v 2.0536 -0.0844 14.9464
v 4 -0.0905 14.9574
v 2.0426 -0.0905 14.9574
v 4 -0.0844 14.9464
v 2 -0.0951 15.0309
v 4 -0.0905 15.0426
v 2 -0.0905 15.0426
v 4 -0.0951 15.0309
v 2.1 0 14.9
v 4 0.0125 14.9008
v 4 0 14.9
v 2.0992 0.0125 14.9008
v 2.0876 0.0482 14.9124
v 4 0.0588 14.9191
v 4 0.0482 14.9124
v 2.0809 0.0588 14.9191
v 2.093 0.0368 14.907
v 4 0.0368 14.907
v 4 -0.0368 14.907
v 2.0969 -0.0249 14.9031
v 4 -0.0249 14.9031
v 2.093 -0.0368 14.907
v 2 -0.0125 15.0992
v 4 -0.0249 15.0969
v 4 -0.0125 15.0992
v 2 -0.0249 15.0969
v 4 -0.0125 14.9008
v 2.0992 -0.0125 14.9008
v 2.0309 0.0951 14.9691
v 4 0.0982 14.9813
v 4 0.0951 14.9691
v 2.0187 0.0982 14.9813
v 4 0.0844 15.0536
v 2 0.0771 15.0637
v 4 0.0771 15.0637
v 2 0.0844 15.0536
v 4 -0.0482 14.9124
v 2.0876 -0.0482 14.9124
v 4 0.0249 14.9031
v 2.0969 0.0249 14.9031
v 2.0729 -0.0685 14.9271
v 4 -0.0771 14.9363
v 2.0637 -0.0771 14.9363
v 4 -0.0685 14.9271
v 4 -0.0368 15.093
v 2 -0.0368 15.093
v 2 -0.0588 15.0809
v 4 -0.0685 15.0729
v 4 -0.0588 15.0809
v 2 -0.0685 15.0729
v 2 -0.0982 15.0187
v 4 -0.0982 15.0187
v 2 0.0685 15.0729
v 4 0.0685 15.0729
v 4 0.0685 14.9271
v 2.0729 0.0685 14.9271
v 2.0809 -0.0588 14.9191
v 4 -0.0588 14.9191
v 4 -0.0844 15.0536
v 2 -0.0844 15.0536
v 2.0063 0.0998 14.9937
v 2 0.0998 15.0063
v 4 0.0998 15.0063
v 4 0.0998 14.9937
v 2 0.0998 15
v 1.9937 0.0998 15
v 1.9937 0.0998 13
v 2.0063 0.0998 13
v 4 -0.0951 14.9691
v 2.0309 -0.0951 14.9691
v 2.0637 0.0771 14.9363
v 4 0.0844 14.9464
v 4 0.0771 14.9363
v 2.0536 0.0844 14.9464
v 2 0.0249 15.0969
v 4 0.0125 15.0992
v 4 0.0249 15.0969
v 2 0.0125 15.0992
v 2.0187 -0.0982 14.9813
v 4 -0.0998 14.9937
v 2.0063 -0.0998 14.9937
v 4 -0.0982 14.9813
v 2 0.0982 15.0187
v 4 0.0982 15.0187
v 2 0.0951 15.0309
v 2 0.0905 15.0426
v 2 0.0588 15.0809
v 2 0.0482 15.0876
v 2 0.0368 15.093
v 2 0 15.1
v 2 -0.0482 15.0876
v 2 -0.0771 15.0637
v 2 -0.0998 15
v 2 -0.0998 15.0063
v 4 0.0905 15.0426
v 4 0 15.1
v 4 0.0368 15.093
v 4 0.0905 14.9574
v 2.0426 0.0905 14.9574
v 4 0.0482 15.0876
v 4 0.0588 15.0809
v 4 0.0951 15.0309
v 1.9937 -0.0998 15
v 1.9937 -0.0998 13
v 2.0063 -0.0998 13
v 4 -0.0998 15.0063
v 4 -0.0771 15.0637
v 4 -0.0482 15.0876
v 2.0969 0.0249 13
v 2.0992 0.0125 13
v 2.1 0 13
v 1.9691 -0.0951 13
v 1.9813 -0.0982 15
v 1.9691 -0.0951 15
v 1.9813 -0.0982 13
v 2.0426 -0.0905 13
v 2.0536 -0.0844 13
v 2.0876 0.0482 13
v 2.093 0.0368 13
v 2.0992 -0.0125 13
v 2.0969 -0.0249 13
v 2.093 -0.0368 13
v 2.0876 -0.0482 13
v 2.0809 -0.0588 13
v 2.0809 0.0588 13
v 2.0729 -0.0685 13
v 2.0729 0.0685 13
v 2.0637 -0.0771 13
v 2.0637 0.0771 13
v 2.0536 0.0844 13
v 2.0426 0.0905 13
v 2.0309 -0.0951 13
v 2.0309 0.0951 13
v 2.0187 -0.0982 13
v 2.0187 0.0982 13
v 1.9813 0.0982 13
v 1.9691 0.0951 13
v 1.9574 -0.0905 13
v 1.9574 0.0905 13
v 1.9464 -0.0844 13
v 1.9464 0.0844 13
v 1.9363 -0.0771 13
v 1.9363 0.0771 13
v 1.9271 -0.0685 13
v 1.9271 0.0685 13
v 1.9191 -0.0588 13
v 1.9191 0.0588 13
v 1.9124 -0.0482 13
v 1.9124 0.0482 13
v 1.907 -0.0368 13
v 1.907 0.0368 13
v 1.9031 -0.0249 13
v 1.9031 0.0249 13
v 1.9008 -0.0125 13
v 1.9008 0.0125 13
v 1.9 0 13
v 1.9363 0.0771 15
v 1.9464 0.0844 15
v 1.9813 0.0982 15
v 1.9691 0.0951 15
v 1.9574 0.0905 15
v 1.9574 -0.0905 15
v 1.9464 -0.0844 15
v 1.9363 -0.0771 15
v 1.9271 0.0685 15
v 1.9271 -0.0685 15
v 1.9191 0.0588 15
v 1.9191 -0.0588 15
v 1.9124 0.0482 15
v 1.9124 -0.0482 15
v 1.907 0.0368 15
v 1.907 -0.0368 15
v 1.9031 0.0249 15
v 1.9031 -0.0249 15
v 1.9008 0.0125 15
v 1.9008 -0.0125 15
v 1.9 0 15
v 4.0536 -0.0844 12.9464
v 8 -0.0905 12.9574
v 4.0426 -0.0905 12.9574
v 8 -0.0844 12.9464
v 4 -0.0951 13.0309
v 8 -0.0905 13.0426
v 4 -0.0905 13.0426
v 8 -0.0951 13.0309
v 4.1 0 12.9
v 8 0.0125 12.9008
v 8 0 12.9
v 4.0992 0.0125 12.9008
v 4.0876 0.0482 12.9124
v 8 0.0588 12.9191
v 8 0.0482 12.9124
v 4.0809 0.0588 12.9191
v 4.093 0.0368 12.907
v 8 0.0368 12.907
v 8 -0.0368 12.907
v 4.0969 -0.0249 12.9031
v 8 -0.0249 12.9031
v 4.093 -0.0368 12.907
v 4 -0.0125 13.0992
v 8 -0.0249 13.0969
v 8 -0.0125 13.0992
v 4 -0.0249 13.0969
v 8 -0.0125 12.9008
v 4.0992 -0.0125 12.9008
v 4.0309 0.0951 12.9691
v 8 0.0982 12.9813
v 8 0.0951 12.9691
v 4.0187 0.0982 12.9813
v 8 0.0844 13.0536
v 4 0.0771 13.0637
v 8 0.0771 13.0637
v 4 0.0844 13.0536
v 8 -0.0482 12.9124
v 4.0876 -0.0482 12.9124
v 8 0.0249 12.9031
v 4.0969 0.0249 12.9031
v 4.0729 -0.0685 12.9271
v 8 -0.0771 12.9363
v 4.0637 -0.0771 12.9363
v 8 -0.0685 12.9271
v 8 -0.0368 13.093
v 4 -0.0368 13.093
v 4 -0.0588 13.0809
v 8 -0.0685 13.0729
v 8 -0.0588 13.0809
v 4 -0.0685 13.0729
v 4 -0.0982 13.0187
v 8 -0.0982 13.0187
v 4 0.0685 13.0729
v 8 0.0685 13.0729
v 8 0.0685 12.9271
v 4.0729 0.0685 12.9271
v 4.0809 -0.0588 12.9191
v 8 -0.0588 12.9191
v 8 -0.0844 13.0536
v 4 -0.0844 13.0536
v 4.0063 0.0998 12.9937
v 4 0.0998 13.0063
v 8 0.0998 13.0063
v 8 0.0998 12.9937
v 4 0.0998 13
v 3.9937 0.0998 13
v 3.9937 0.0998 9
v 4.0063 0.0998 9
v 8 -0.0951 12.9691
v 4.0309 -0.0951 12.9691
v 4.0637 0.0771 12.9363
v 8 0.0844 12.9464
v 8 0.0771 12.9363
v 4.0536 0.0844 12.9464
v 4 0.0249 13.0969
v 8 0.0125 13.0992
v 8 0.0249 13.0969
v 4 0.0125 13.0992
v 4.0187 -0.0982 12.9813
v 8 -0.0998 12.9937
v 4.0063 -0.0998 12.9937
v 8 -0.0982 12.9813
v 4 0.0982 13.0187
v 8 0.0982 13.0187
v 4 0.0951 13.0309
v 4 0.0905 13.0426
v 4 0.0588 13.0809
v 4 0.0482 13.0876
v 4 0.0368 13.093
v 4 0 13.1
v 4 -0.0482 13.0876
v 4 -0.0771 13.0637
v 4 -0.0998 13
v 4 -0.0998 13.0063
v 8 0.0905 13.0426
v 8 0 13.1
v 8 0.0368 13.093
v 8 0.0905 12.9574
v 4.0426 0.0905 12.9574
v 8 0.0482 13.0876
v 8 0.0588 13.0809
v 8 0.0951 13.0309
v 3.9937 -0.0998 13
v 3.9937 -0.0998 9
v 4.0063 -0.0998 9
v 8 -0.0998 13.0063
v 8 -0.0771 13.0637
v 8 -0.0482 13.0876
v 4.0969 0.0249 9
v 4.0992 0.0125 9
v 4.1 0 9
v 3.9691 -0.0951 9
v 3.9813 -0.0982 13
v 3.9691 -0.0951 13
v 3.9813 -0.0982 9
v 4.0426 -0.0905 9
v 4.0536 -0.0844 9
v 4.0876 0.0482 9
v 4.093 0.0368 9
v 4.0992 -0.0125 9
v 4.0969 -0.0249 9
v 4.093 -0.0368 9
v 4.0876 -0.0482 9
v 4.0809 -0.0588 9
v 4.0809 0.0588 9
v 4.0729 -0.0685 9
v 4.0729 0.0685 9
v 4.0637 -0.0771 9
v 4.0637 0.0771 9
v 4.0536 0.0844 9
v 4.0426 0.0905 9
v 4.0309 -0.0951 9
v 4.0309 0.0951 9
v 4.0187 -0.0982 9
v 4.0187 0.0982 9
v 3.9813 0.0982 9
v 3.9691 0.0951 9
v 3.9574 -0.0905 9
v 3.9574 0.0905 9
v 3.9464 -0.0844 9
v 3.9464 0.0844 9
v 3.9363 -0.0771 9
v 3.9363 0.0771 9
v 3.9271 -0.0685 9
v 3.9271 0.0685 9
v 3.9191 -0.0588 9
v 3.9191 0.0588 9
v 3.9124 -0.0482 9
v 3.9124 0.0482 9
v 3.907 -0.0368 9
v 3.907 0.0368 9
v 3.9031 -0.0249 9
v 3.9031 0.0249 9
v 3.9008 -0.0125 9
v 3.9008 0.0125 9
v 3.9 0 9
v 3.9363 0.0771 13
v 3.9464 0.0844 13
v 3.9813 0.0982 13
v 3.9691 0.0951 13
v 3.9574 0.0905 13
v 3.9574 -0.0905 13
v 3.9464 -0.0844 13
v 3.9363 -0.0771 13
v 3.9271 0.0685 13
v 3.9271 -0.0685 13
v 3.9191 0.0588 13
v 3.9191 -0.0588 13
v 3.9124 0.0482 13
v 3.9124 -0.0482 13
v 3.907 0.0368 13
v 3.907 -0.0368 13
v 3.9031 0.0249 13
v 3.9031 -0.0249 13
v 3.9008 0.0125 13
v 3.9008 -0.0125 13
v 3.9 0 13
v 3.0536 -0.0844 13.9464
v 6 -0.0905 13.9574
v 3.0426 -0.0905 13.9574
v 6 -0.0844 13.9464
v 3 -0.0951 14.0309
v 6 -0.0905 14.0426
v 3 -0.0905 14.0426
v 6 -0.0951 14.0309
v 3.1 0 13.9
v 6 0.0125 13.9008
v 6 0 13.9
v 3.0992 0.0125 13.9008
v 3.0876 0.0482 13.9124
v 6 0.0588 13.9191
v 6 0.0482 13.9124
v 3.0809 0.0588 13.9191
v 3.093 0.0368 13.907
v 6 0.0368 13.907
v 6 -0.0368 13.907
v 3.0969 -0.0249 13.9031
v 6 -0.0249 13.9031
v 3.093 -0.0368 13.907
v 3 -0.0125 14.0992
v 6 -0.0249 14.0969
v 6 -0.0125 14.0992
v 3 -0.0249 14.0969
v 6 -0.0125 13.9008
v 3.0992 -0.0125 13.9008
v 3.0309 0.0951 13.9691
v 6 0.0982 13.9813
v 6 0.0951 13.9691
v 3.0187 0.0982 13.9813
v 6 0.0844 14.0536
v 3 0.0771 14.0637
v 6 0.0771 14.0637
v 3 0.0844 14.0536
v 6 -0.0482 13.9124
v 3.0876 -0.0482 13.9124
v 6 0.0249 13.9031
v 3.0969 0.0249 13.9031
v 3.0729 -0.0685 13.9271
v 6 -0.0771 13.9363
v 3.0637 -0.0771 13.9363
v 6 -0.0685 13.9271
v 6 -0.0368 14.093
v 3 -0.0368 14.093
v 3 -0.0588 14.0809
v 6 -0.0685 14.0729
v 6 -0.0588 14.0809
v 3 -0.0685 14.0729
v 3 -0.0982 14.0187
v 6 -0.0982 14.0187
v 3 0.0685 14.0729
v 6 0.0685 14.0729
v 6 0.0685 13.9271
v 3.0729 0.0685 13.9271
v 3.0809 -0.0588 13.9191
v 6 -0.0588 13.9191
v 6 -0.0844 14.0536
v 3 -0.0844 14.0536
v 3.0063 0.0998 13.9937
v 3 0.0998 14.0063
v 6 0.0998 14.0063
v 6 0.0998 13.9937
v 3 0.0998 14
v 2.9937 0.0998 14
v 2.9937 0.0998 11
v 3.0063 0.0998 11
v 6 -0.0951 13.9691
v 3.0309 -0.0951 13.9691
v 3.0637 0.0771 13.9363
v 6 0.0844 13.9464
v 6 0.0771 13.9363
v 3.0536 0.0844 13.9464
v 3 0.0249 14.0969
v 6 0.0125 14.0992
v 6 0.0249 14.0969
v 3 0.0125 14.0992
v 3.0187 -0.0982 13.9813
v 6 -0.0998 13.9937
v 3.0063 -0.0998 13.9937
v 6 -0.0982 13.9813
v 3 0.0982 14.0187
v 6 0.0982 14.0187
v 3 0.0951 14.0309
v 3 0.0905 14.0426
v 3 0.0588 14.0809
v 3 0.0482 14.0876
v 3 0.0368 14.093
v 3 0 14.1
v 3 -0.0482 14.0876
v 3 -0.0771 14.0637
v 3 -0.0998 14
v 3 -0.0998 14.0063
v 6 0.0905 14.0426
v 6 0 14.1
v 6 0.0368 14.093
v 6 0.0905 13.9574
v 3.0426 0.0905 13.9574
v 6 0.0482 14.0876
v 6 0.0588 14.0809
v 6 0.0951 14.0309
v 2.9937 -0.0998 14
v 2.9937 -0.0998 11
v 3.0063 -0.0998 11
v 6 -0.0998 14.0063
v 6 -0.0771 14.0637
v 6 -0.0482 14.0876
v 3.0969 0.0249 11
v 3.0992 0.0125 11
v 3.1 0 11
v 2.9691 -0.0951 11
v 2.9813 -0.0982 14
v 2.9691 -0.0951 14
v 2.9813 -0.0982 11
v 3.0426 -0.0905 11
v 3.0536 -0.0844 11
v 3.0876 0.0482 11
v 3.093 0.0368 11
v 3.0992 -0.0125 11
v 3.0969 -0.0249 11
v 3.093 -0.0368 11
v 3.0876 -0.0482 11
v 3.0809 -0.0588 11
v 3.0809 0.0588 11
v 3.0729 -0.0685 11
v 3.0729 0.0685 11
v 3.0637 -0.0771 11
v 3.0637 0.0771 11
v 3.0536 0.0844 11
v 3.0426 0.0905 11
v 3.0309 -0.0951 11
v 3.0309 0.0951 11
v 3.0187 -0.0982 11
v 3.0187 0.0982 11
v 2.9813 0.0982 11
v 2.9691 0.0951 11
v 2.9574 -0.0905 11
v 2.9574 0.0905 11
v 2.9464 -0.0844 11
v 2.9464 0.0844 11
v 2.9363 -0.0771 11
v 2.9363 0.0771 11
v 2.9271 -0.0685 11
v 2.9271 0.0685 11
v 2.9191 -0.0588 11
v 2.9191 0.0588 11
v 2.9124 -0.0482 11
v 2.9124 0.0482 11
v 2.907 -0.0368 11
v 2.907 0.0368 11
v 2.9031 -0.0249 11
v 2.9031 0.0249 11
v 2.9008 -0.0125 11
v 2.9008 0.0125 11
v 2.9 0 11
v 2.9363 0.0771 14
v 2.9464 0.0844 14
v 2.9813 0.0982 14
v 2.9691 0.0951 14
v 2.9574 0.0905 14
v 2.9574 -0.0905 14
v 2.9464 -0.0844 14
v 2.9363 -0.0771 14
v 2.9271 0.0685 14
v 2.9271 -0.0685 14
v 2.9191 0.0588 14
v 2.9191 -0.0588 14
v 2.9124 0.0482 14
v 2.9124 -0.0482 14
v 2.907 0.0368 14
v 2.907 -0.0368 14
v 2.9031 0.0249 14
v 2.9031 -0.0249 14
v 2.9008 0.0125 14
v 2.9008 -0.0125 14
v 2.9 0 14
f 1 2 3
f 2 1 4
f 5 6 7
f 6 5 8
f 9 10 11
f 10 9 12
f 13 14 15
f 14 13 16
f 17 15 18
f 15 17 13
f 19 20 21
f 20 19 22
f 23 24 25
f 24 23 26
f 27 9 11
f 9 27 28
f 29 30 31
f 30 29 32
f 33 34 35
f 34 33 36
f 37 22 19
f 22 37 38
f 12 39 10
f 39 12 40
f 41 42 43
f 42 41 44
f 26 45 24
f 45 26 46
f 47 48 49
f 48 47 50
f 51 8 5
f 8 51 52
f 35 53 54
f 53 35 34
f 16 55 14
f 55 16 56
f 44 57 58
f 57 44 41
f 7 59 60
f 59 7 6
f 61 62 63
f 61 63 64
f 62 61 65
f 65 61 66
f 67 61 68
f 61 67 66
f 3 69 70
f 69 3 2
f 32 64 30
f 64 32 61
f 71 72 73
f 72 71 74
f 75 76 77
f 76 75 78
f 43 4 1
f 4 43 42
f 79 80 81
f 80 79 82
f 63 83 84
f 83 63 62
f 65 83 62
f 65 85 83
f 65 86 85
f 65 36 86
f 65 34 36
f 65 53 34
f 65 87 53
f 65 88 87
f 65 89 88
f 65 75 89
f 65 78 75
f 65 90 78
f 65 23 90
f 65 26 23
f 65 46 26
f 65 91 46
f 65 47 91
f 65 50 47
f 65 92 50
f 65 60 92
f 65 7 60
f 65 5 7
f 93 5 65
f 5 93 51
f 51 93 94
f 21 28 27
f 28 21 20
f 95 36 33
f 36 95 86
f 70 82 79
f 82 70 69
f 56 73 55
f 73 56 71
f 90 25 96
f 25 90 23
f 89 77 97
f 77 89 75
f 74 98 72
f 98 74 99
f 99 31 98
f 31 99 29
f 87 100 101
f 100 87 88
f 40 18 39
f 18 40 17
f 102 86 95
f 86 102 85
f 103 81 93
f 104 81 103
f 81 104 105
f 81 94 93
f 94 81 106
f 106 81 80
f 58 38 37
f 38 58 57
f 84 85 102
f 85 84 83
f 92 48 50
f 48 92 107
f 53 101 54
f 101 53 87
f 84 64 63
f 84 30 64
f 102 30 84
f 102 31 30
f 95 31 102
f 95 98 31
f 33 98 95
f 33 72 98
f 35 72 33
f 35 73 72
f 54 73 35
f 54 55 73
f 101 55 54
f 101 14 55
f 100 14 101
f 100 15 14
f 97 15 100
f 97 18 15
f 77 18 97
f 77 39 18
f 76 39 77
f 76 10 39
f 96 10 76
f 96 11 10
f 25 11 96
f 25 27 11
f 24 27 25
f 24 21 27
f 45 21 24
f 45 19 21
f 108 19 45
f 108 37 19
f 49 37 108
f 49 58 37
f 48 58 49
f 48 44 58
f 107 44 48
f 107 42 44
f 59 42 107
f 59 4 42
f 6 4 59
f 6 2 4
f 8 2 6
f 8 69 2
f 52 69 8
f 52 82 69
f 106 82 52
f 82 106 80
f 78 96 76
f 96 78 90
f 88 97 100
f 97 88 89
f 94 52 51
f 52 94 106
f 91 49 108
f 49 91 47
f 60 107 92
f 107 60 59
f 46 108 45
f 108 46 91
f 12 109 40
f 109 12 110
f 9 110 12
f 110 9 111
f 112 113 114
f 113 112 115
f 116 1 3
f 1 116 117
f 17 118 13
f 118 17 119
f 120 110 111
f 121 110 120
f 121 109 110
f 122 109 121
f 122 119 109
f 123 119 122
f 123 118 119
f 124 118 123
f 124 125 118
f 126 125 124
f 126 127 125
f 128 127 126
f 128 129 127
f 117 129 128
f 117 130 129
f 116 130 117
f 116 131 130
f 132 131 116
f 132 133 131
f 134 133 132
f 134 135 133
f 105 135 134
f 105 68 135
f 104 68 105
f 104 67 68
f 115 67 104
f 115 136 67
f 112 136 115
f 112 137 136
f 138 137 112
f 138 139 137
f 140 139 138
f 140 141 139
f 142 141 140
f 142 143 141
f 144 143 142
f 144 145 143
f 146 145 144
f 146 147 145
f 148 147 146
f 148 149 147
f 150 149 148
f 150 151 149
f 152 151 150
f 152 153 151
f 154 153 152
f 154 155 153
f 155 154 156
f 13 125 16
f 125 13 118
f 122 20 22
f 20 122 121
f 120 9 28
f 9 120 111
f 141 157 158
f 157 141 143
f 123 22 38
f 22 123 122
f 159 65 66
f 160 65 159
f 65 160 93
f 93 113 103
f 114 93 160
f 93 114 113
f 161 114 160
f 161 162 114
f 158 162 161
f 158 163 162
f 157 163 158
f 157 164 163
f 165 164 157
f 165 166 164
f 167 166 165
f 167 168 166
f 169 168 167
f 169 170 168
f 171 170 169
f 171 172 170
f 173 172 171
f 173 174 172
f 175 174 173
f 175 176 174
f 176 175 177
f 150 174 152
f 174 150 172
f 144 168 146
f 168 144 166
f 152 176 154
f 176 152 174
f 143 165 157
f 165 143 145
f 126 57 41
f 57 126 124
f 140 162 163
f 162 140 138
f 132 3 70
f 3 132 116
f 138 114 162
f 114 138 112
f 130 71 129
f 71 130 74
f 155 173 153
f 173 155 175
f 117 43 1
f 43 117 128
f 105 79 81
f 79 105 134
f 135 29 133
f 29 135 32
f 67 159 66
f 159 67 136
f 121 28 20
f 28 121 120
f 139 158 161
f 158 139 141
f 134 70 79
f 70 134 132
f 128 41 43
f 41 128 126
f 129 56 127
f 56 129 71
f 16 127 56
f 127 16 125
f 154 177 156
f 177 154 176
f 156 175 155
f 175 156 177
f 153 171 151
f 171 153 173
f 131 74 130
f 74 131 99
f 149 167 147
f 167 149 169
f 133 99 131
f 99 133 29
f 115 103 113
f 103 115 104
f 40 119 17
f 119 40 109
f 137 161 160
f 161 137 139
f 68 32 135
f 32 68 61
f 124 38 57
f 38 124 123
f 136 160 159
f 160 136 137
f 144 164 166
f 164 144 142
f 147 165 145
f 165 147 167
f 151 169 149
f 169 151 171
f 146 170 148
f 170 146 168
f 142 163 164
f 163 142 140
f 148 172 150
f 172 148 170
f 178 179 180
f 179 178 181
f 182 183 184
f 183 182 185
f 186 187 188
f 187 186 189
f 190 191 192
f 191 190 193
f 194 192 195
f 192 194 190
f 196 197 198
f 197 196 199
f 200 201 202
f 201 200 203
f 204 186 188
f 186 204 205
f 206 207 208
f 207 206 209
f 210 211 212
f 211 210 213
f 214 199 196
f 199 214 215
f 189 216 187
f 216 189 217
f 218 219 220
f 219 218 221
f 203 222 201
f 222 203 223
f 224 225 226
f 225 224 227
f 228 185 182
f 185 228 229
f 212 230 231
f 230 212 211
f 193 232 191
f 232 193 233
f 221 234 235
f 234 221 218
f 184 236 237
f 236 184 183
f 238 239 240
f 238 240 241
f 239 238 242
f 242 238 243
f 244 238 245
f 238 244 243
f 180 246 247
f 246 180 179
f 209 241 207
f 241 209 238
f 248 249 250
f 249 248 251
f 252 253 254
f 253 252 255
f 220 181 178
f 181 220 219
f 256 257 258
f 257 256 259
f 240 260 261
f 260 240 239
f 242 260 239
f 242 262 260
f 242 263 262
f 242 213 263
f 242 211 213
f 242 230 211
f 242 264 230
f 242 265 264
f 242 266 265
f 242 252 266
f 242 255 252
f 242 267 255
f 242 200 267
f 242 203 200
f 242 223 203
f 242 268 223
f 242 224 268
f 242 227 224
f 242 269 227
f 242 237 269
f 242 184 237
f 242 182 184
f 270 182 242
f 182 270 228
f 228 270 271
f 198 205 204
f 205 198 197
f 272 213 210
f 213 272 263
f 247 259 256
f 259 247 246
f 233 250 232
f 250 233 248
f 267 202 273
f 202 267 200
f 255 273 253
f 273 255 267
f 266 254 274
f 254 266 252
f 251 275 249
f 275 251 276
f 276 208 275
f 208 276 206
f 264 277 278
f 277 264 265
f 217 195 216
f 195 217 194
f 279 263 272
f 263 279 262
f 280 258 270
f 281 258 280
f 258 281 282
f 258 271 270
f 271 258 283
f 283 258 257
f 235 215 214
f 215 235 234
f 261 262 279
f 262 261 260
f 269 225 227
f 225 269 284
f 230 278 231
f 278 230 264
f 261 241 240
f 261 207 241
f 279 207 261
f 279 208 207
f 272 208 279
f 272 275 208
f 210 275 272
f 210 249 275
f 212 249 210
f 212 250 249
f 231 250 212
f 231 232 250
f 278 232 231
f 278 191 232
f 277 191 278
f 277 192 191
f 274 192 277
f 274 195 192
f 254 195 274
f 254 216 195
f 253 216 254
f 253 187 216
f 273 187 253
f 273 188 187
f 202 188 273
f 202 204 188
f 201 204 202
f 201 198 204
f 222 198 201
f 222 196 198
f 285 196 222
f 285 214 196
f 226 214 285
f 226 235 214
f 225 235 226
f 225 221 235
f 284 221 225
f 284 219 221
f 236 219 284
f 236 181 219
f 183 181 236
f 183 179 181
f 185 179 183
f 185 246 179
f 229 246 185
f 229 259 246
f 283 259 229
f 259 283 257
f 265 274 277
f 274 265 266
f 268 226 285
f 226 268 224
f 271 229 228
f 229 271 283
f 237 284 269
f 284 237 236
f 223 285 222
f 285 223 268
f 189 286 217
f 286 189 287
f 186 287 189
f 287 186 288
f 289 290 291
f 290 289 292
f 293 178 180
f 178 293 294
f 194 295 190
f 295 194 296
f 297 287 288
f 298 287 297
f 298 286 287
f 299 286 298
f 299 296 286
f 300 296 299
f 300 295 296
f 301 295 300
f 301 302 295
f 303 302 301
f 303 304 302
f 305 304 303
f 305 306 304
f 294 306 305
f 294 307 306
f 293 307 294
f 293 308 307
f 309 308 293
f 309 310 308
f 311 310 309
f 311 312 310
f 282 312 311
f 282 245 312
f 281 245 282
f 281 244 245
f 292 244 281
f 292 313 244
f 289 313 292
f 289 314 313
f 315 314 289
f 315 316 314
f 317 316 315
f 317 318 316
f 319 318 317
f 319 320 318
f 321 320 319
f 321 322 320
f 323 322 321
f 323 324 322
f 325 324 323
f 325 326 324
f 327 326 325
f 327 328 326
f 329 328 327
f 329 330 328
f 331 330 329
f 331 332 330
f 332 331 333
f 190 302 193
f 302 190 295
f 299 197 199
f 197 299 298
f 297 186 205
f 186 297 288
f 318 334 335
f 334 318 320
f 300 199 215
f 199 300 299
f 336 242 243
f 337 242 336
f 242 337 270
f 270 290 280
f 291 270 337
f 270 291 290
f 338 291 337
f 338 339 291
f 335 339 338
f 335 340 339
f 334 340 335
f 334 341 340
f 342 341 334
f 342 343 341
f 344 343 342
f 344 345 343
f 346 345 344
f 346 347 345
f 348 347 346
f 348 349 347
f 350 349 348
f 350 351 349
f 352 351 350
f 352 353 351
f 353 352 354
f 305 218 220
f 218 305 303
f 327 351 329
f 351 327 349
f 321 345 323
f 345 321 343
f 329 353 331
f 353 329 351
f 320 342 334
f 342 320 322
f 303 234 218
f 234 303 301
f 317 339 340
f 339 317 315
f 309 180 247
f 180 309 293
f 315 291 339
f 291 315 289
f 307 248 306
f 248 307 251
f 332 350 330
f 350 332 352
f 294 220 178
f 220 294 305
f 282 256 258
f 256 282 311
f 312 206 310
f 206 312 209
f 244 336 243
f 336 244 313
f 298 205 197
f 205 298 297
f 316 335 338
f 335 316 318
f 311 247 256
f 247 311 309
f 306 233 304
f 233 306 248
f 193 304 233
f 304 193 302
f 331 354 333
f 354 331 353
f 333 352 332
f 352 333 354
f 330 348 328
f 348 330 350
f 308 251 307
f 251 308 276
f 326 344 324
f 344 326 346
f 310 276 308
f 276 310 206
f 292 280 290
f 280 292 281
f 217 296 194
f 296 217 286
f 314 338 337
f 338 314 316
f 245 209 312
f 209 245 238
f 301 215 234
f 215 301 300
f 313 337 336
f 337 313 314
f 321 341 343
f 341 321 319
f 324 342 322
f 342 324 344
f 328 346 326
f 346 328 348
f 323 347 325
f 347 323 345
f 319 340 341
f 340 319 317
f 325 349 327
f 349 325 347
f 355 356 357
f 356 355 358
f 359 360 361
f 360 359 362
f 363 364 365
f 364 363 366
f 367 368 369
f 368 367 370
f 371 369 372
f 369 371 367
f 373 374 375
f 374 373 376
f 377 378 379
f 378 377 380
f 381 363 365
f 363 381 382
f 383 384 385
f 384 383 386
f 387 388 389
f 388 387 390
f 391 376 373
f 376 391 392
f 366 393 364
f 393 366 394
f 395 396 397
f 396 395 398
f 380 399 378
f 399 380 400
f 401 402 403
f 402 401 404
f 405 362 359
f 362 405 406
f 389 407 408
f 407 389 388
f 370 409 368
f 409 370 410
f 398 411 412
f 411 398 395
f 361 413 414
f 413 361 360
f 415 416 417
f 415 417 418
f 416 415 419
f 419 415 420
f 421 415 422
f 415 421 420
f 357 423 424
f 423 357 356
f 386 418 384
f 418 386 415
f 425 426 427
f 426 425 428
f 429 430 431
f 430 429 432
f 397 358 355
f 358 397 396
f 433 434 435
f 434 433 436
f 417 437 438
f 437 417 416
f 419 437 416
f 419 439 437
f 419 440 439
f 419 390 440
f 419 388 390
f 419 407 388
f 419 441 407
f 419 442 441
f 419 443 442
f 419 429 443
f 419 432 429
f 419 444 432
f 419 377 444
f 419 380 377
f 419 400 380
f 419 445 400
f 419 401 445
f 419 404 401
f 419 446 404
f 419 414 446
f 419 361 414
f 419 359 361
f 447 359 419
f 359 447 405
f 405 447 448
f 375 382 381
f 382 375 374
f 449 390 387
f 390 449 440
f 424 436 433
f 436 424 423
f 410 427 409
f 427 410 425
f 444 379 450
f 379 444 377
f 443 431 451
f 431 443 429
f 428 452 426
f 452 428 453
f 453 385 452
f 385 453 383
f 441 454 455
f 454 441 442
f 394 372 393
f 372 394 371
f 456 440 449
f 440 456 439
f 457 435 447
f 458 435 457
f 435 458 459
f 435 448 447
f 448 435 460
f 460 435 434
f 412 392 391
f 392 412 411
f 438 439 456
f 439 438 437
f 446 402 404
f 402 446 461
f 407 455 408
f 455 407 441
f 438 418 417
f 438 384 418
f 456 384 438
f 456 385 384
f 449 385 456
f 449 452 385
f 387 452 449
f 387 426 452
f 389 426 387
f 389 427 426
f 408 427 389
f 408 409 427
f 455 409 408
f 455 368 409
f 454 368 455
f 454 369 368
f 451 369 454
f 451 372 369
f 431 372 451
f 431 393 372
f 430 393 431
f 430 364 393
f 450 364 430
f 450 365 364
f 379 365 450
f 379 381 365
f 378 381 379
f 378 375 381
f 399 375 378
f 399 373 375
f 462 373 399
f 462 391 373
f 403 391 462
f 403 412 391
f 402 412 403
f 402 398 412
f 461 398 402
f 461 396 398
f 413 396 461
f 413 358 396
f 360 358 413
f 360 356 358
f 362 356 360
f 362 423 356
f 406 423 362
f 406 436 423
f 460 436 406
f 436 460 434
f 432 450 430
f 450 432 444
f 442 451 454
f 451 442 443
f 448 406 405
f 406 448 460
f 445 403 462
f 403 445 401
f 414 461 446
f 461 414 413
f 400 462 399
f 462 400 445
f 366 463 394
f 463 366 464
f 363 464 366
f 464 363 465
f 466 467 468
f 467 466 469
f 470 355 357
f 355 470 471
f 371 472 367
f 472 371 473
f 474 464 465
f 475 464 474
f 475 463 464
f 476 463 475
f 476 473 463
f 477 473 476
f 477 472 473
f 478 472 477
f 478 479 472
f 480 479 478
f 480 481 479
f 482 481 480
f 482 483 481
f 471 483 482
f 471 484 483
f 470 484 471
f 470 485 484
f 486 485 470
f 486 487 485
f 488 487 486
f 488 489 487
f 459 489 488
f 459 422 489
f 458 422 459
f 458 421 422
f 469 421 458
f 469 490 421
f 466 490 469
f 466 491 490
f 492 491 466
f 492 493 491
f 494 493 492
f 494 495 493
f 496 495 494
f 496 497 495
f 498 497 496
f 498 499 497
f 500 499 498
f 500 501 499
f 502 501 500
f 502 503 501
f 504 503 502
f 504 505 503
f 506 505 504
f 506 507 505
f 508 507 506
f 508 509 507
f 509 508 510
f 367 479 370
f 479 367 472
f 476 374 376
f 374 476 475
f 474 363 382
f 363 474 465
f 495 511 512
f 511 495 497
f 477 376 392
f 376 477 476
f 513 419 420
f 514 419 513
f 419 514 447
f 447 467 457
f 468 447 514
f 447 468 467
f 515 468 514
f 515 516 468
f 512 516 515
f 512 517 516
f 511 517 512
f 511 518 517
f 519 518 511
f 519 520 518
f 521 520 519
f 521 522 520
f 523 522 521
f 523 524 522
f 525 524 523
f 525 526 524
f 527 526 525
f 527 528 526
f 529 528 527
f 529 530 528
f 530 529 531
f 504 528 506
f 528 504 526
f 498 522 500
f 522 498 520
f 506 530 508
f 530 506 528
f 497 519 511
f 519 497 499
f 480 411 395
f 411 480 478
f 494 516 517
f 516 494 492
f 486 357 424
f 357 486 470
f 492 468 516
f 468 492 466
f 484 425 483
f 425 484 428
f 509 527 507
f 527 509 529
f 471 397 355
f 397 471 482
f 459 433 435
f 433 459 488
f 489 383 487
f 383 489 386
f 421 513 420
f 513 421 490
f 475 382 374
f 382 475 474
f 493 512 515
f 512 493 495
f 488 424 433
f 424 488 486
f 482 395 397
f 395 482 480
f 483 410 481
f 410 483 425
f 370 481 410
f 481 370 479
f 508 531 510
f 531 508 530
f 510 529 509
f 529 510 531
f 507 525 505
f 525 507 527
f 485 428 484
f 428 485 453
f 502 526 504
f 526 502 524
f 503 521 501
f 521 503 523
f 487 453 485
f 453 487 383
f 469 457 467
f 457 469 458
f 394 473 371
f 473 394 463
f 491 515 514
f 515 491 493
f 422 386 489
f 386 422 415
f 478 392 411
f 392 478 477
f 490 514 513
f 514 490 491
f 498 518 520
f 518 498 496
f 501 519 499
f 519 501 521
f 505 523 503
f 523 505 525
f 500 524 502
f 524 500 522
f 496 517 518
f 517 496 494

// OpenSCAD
translate([2, 0, 15]) {
    rotate([0, 90, 0]) {
        cylinder(h = 2, $fn = 50, r = 0.1);
    }
}

translate([2, 0, 13]) {
   cylinder(h = 2, $fn = 50, r = 0.1);
}


translate([4, 0, 13]) {
    rotate([0, 90, 0]) {
        cylinder(h = 4, $fn = 50, r = 0.1);
    }
}

translate([4, 0, 9]) {
   cylinder(h = 4, $fn = 50, r = 0.1);
}

translate([3, 0, 14]) {
    rotate([0, 90, 0]) {
        cylinder(h = 3, $fn = 50, r = 0.1);
    }
}

translate([3, 0, 11]) {
   cylinder(h = 3, $fn = 50, r = 0.1);
}
